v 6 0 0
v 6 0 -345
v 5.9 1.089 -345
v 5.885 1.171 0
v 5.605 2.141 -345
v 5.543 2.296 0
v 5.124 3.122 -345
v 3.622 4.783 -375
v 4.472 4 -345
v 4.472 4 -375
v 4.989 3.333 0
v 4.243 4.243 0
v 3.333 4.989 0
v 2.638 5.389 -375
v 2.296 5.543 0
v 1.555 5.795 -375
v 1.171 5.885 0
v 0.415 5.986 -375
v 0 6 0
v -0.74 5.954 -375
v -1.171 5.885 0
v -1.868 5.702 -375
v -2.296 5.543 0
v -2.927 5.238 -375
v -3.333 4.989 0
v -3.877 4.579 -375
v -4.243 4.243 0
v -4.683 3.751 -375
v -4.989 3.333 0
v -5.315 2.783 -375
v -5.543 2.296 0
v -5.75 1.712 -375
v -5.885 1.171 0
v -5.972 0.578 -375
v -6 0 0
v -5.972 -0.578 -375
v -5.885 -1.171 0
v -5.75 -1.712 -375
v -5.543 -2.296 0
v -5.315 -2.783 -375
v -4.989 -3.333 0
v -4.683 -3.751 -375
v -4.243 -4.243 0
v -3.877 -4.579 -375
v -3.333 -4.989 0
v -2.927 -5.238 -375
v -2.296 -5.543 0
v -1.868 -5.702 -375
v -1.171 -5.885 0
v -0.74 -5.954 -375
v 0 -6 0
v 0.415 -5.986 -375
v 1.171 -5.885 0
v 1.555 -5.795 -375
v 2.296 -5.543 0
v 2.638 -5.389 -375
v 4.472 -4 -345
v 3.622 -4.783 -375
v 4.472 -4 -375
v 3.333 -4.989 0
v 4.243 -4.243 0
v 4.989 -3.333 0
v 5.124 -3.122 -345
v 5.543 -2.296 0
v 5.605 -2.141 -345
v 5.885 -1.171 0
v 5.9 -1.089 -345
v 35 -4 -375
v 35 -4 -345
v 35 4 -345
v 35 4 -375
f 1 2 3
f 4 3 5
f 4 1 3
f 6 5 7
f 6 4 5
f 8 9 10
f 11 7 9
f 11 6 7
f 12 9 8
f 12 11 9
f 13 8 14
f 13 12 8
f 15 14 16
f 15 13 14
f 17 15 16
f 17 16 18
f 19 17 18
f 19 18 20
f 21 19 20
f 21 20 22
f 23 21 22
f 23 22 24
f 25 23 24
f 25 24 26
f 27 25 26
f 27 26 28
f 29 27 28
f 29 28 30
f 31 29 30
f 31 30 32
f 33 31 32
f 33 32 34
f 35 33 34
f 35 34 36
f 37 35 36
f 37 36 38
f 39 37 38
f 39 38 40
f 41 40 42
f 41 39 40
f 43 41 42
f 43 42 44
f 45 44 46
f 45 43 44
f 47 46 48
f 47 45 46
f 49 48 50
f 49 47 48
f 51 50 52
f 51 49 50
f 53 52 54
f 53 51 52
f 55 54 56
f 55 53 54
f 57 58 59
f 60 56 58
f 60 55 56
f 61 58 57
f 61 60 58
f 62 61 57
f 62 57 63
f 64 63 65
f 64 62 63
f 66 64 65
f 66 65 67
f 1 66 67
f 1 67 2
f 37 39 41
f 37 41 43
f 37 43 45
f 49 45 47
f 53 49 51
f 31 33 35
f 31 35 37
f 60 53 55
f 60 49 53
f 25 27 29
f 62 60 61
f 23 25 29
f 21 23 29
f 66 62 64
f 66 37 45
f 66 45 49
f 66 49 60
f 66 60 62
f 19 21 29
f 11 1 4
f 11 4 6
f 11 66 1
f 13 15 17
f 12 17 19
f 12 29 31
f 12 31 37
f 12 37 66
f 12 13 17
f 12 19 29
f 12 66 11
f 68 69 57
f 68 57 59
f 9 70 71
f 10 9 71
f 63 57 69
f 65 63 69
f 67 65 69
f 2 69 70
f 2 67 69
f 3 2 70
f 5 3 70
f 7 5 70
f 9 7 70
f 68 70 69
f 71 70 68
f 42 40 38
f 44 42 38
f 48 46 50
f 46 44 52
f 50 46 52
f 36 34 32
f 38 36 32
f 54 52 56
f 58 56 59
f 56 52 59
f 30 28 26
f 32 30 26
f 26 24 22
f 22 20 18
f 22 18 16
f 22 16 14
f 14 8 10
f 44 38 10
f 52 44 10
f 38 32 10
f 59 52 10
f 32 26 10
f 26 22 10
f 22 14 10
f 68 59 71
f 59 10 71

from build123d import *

# Parameters (mm, degrees)
SKETCH1_R           = 6
BOSS_EXTRUDE1_DEPTH = 375
SKETCH2_W           = 30
SKETCH2_H           = 8
BOSS_EXTRUDE2_DEPTH = 35


with BuildPart() as part:
    # Sketch1 → Boss-Extrude1 (new body)
    with BuildSketch(Plane.XY):
        Circle(SKETCH1_R)
    extrude(amount=-BOSS_EXTRUDE1_DEPTH)

    # Sketch2 → Boss-Extrude2 (add)
    with BuildSketch(Plane(origin=(0, 0, 0), x_dir=(0, 0, -1), z_dir=(1, 0, 0))):
        with Locations((360, 0)):
            Rectangle(SKETCH2_W, SKETCH2_H)
    extrude(amount=BOSS_EXTRUDE2_DEPTH)


solid = part.part
